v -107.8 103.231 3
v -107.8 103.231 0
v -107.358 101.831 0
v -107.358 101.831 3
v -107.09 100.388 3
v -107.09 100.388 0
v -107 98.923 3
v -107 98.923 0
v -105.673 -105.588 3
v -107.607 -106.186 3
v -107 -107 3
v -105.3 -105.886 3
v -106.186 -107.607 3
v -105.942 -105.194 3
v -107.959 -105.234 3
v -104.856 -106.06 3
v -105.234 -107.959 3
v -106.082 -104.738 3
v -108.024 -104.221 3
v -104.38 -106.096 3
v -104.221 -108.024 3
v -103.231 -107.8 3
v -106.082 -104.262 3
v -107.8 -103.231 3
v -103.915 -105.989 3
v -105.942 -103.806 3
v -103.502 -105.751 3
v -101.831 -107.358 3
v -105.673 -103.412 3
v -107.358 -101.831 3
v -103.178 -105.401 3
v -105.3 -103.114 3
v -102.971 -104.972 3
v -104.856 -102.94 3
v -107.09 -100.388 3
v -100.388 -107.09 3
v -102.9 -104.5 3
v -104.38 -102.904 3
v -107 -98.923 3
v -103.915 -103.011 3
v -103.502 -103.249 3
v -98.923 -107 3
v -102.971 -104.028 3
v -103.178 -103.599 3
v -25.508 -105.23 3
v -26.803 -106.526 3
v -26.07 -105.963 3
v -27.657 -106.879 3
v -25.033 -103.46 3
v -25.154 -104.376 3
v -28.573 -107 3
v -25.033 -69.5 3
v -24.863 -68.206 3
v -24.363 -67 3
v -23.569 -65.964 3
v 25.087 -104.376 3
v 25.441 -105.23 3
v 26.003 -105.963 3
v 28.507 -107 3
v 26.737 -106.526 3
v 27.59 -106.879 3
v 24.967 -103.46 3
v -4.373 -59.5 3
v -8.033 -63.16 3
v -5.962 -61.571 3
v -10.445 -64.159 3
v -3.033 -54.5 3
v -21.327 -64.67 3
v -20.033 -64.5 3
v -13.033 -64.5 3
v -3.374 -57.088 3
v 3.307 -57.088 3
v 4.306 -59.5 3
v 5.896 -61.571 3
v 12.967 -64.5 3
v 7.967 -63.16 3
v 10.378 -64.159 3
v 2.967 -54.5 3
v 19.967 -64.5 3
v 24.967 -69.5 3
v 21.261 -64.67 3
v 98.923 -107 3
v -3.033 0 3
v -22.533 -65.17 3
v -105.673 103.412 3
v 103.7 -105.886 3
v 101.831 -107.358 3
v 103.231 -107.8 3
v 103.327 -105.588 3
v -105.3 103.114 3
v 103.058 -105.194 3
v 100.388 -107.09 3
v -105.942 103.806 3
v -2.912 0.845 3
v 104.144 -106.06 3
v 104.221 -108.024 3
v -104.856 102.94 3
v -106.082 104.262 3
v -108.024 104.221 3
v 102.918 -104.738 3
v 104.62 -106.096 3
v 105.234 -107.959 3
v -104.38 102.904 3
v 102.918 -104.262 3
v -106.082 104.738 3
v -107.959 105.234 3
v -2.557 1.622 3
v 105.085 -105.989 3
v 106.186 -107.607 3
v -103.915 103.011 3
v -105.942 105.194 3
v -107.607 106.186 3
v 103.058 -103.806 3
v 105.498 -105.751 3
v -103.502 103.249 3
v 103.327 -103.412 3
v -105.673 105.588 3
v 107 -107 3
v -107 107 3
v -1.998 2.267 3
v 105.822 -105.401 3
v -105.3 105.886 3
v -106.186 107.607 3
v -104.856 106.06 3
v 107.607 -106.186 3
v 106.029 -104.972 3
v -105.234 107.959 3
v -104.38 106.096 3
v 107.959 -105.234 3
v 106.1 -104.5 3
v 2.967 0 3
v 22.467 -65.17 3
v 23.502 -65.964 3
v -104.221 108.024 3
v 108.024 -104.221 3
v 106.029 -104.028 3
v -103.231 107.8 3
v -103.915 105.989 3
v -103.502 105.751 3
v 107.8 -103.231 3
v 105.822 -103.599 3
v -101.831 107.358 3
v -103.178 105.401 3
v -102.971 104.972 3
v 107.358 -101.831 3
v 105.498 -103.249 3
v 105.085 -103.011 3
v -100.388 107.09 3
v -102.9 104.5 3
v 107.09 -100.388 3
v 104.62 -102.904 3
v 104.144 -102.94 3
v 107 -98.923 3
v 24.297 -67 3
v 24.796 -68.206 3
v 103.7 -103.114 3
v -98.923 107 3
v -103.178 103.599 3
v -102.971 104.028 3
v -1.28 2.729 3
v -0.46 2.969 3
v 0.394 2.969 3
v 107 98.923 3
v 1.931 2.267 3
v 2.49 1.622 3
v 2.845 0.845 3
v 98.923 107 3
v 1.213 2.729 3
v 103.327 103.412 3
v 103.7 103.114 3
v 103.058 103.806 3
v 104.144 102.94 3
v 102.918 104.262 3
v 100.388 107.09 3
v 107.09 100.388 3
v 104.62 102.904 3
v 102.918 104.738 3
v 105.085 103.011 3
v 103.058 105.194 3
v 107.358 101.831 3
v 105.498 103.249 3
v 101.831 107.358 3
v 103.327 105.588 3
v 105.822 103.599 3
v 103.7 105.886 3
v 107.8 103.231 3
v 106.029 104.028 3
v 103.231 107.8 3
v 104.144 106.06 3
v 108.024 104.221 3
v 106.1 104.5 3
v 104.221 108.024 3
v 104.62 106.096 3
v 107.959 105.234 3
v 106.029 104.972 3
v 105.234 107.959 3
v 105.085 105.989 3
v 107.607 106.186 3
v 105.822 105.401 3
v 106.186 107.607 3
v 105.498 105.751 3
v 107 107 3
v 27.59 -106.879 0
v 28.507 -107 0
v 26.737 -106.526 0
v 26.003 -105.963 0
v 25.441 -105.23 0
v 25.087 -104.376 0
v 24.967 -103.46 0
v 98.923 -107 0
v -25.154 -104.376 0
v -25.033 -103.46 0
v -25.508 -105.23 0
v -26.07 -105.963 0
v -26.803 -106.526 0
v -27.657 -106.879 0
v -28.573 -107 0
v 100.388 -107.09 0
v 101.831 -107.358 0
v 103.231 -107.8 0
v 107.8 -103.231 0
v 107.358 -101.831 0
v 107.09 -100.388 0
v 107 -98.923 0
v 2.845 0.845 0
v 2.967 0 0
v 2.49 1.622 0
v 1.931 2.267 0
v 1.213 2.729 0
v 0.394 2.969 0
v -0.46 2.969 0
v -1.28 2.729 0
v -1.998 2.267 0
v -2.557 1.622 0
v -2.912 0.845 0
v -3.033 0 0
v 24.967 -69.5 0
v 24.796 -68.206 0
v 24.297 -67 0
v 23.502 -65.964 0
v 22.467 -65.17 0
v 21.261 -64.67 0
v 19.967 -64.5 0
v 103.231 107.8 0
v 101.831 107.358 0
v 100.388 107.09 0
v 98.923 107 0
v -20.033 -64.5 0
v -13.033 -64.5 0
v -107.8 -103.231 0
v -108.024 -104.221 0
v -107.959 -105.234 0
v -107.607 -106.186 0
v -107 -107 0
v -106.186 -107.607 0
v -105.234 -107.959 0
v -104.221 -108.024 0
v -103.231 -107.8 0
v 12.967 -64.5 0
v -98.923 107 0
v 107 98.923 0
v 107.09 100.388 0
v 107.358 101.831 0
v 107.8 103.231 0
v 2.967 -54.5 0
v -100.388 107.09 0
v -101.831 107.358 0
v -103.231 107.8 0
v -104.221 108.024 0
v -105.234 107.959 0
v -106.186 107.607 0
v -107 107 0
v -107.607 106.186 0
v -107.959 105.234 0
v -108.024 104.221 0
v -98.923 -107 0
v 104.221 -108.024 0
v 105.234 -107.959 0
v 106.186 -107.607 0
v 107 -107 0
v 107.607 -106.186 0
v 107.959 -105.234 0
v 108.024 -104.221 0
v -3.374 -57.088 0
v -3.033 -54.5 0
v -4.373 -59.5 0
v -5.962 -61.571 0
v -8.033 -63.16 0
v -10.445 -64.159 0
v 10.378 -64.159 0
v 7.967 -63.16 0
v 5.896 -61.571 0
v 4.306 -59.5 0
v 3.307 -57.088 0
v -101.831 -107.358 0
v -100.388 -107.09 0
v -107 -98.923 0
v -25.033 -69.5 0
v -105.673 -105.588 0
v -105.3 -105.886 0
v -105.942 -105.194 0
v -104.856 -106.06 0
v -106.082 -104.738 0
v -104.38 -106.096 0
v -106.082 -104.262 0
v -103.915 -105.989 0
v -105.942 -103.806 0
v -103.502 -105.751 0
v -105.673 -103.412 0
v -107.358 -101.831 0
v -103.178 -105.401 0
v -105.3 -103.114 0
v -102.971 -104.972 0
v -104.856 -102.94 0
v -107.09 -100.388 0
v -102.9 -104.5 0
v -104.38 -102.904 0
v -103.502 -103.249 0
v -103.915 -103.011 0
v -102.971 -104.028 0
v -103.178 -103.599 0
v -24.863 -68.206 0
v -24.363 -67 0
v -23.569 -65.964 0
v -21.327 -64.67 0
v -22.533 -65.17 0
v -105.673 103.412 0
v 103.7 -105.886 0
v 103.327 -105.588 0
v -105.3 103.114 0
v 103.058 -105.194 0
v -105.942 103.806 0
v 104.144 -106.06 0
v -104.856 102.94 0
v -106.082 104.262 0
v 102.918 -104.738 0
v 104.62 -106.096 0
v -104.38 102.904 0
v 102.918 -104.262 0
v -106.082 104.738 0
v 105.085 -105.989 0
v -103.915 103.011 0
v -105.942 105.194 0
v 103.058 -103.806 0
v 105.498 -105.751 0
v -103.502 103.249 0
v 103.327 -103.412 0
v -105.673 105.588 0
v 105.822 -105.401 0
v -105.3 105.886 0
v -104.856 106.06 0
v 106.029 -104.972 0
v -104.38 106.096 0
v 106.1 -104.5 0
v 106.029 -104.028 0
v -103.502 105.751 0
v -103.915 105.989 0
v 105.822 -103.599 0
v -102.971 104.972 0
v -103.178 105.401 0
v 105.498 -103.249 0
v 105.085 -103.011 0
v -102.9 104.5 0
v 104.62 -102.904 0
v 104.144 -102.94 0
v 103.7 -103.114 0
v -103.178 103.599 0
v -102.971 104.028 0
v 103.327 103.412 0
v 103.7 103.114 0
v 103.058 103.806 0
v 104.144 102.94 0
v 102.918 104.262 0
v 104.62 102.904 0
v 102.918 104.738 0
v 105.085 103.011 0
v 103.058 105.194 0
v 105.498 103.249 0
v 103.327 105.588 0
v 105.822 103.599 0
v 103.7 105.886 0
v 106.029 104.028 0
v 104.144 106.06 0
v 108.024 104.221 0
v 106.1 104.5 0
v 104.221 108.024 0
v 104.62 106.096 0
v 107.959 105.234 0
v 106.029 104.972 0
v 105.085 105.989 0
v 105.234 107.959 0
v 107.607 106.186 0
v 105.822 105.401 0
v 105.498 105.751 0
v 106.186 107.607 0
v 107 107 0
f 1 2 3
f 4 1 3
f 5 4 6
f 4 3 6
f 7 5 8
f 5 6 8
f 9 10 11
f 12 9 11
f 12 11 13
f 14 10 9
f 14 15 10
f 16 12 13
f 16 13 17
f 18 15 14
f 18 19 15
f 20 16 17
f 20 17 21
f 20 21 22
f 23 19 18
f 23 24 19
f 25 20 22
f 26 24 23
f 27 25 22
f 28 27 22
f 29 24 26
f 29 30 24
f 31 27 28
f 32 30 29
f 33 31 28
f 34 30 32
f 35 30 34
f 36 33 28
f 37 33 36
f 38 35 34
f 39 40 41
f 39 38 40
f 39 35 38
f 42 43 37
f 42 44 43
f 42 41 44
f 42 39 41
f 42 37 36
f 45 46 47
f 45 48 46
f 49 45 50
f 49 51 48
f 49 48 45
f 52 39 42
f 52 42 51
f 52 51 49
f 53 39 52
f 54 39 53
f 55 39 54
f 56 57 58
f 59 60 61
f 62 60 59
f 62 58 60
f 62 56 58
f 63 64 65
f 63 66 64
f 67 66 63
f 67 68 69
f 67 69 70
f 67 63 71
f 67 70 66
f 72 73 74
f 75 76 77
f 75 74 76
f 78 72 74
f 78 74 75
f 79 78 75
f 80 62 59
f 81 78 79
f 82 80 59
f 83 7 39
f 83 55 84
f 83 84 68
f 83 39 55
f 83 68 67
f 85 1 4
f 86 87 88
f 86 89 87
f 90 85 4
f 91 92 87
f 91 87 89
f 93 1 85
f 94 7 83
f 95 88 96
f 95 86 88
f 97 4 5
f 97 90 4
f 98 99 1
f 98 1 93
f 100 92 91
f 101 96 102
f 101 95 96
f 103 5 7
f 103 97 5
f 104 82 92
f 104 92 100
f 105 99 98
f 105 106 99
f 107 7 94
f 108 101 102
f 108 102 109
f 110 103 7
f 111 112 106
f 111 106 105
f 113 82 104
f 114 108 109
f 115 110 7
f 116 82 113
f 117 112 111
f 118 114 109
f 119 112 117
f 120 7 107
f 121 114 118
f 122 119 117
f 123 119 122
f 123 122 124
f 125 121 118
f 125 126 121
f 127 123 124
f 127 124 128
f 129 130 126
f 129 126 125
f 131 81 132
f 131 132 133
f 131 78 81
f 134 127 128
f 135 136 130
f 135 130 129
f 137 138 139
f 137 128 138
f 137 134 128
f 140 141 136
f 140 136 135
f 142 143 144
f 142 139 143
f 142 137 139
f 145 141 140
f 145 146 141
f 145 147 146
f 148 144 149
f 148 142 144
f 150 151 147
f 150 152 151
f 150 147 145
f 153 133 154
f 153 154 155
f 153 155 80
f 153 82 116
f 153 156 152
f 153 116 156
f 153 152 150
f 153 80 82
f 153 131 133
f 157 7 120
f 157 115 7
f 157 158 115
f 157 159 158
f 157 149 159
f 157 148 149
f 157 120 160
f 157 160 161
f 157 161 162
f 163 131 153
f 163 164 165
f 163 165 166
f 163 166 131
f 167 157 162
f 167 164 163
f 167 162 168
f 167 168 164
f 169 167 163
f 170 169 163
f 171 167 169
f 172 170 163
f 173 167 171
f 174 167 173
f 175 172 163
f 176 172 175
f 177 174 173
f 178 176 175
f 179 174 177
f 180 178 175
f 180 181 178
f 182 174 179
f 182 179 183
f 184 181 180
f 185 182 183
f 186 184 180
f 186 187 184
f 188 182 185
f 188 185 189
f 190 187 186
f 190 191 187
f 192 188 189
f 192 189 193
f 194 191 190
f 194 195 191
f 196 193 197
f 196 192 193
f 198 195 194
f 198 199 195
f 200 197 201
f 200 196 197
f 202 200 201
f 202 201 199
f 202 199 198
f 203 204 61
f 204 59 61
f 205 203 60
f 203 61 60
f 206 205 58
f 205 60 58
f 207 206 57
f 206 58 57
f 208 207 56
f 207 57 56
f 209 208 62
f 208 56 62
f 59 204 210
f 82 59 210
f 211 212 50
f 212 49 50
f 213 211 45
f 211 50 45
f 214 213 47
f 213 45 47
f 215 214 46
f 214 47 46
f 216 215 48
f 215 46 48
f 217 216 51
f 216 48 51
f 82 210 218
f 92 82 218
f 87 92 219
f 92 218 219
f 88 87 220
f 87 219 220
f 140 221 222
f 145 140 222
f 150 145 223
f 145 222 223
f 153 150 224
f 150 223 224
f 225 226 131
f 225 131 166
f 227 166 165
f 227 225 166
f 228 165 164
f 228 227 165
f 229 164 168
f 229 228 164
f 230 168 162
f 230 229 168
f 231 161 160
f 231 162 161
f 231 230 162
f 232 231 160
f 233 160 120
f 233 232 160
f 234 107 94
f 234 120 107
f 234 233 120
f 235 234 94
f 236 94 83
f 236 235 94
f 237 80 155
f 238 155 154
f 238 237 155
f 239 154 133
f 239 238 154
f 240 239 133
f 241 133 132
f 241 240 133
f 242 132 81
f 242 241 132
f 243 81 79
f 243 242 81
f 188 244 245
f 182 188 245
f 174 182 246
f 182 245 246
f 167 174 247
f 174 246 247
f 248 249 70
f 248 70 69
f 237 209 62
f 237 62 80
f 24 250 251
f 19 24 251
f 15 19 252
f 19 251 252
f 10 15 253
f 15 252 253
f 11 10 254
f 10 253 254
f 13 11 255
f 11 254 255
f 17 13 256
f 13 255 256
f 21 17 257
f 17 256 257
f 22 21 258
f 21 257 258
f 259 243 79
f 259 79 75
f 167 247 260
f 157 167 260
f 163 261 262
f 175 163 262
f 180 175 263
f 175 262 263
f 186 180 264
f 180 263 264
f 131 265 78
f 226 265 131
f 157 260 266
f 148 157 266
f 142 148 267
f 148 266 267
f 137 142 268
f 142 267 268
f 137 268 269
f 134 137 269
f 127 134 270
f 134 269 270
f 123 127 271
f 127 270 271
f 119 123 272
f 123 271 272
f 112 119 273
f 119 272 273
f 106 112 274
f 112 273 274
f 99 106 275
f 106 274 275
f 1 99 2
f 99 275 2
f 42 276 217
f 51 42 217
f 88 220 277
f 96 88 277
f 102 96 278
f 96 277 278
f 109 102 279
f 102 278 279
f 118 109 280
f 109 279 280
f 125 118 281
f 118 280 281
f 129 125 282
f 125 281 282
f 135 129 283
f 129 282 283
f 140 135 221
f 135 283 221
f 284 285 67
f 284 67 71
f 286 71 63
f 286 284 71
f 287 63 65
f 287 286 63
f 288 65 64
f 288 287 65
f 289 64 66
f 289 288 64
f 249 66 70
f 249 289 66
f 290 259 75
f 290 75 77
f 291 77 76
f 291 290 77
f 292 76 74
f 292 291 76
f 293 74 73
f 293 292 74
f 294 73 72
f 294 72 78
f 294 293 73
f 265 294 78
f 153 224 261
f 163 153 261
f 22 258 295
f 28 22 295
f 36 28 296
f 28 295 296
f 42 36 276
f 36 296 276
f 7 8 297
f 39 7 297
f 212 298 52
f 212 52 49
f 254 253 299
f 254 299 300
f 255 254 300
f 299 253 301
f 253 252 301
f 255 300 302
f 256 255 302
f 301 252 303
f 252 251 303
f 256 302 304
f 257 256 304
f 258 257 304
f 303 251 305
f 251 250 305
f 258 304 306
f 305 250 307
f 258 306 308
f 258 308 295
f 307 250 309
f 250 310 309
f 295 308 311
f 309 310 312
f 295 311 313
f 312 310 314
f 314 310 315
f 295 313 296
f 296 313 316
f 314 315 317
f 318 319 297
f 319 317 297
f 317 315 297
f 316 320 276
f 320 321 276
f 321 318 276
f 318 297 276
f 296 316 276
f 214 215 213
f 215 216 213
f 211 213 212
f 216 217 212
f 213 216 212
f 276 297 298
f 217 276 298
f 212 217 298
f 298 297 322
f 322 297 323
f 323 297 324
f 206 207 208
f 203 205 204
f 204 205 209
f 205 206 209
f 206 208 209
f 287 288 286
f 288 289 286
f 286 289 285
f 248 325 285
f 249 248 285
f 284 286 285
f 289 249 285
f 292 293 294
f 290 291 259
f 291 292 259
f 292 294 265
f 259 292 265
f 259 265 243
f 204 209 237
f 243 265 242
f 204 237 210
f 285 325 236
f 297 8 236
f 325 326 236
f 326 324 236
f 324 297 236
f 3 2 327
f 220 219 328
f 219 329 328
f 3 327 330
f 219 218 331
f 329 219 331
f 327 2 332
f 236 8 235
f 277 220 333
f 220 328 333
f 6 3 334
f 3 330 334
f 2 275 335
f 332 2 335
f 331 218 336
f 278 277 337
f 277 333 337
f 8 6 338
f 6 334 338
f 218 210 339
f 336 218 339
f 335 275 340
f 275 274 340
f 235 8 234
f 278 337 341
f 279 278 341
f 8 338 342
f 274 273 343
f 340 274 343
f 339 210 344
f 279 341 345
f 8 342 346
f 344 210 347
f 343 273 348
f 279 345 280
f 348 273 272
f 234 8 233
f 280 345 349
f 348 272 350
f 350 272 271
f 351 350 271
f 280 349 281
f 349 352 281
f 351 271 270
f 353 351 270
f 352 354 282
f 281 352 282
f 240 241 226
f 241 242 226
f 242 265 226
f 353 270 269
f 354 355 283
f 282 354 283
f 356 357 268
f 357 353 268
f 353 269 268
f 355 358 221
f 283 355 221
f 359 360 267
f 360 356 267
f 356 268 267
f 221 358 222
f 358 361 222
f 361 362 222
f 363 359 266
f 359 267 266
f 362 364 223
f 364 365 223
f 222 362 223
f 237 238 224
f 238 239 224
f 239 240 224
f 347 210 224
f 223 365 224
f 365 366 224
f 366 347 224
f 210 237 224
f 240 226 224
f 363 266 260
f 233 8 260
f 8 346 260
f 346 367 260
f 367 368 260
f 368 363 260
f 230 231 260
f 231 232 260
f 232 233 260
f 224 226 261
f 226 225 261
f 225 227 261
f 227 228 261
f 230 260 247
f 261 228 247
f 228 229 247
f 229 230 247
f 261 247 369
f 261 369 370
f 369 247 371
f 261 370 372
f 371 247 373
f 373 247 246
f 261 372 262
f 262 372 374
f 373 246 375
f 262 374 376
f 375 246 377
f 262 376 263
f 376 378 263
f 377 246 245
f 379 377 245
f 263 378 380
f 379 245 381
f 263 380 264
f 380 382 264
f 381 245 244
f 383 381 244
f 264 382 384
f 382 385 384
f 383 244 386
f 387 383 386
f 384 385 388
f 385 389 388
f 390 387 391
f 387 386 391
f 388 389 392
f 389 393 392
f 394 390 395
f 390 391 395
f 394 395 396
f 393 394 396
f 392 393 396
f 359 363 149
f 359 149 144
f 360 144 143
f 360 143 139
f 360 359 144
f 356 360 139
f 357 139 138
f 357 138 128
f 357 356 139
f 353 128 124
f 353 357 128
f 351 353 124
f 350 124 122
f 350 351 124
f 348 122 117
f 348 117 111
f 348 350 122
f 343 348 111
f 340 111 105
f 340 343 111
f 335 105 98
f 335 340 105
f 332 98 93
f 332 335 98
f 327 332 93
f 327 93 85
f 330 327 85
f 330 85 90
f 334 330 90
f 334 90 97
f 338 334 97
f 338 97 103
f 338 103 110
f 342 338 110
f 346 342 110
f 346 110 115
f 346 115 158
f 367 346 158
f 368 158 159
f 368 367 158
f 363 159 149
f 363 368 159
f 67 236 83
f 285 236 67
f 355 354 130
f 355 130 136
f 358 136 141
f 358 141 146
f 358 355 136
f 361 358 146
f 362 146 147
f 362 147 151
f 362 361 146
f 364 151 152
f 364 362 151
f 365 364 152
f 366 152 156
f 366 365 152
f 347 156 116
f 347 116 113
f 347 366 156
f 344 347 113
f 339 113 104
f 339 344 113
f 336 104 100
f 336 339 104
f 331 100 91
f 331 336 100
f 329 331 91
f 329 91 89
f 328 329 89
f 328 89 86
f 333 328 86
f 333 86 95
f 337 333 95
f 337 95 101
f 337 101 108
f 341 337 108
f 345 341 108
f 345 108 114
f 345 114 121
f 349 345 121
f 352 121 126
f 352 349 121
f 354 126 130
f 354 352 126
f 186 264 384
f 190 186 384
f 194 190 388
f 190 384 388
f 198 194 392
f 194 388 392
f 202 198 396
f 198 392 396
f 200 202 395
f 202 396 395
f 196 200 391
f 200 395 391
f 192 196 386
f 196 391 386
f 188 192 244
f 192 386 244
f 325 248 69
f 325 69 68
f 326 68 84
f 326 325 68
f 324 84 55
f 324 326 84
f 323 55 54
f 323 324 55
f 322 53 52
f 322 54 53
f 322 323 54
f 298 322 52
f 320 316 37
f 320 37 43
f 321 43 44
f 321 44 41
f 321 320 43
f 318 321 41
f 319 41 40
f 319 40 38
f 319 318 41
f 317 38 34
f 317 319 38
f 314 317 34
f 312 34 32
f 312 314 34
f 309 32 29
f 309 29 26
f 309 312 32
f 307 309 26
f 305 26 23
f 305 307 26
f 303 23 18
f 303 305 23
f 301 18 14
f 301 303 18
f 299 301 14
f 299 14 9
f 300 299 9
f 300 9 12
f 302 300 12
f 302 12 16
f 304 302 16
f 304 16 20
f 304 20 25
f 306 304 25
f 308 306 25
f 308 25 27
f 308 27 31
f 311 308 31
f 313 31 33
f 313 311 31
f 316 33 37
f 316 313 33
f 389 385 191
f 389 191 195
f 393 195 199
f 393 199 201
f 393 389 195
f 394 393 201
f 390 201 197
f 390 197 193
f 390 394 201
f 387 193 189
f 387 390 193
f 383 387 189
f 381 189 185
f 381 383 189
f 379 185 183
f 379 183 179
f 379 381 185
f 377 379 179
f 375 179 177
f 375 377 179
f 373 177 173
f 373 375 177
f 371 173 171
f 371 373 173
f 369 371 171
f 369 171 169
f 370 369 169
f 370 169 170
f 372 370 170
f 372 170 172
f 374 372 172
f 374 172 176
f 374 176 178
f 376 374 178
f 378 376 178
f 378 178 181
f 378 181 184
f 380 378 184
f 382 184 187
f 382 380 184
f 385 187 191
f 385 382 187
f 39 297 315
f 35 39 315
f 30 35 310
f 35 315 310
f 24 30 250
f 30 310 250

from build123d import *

# Parameters (mm, degrees)
SKETCH1_R           = 1.6
BOSS_EXTRUDE1_DEPTH = 3
CUT_EXTRUDE5_DEPTH  = 4
FILLET1_R           = 3.54


with BuildPart() as part:
    # Sketch1 → Boss-Extrude1 (new body)
    with BuildSketch(Plane.XY):
        with BuildLine():
            Line((-107, 98.923010333), (-107, -98.923010333))
            ThreePointArc((-107, -98.923010333), (-107.201661971, -101.11372249), (-107.799869959, -103.230804092))
            ThreePointArc((-107.799869959, -103.230804092), (-107, -107), (-103.230804092, -107.799869959))
            ThreePointArc((-103.230804092, -107.799869959), (-101.11372249, -107.201661971), (-98.923010333, -107))
            Line((-98.923010333, -107), (-43, -107))
            Line((-43, -107), (43, -107))
            Line((43, -107), (98.923010333, -107))
            ThreePointArc((98.923010333, -107), (101.11372249, -107.201661971), (103.230804092, -107.799869959))
            ThreePointArc((103.230804092, -107.799869959), (107, -107), (107.799869959, -103.230804092))
            ThreePointArc((107.799869959, -103.230804092), (107.201661971, -101.11372249), (107, -98.923010333))
            Line((107, -98.923010333), (107, 98.923010333))
            ThreePointArc((107, 98.923010333), (107.201661971, 101.11372249), (107.799869959, 103.230804092))
            ThreePointArc((107.799869959, 103.230804092), (107, 107), (103.230804092, 107.799869959))
            ThreePointArc((103.230804092, 107.799869959), (101.11372249, 107.201661971), (98.923010333, 107))
            Line((98.923010333, 107), (-98.923010333, 107))
            ThreePointArc((-98.923010333, 107), (-101.11372249, 107.201661971), (-103.230804092, 107.799869959))
            ThreePointArc((-103.230804092, 107.799869959), (-107, 107), (-107.799869959, 103.230804092))
            ThreePointArc((-107.799869959, 103.230804092), (-107.201661971, 101.11372249), (-107, 98.923010333))
        make_face()
        with Locations((-104.5, -104.5)):
            Circle(SKETCH1_R, mode=Mode.SUBTRACT)
        with Locations((-104.5, 104.5)):
            Circle(SKETCH1_R, mode=Mode.SUBTRACT)
        with Locations((104.5, 104.5)):
            Circle(SKETCH1_R, mode=Mode.SUBTRACT)
        with Locations((104.5, -104.5)):
            Circle(SKETCH1_R, mode=Mode.SUBTRACT)
    extrude(amount=BOSS_EXTRUDE1_DEPTH)

    # Sketch5 → Cut-Extrude5 (cut, through all)
    with BuildSketch(Plane.XY):
        with BuildLine():
            Line((-25.033358746, -107), (24.966641254, -107))
            Line((24.966641254, -107), (24.966641254, -69.5))
            ThreePointArc((24.966641254, -69.5), (23.50217516, -65.964466094), (19.966641254, -64.5))
            Line((19.966641254, -64.5), (12.966641254, -64.5))
            ThreePointArc((12.966641254, -64.5), (5.895573442, -61.571067812), (2.966641254, -54.5))
            Line((2.966641254, -54.5), (2.966641254, 0))
            ThreePointArc((2.966641254, 0), (-0.033358746, 3), (-3.033358746, 0))
            Line((-3.033358746, 0), (-3.033358746, -54.5))
            ThreePointArc((-3.033358746, -54.5), (-5.962290934, -61.571067812), (-13.033358746, -64.5))
            Line((-13.033358746, -64.5), (-20.033358746, -64.5))
            ThreePointArc((-20.033358746, -64.5), (-23.568892652, -65.964466094), (-25.033358746, -69.5))
            Line((-25.033358746, -69.5), (-25.033358746, -107))
        make_face()
    extrude(amount=CUT_EXTRUDE5_DEPTH, mode=Mode.SUBTRACT)

    # Fillet1
    fillet1_edges = [part.edges().sort_by_distance(p)[0] for p in [
        (-25.033358746, -107, 1.5),
        (24.966641254, -107, 1.5),
    ]]
    fillet(fillet1_edges, radius=FILLET1_R)


solid = part.part
